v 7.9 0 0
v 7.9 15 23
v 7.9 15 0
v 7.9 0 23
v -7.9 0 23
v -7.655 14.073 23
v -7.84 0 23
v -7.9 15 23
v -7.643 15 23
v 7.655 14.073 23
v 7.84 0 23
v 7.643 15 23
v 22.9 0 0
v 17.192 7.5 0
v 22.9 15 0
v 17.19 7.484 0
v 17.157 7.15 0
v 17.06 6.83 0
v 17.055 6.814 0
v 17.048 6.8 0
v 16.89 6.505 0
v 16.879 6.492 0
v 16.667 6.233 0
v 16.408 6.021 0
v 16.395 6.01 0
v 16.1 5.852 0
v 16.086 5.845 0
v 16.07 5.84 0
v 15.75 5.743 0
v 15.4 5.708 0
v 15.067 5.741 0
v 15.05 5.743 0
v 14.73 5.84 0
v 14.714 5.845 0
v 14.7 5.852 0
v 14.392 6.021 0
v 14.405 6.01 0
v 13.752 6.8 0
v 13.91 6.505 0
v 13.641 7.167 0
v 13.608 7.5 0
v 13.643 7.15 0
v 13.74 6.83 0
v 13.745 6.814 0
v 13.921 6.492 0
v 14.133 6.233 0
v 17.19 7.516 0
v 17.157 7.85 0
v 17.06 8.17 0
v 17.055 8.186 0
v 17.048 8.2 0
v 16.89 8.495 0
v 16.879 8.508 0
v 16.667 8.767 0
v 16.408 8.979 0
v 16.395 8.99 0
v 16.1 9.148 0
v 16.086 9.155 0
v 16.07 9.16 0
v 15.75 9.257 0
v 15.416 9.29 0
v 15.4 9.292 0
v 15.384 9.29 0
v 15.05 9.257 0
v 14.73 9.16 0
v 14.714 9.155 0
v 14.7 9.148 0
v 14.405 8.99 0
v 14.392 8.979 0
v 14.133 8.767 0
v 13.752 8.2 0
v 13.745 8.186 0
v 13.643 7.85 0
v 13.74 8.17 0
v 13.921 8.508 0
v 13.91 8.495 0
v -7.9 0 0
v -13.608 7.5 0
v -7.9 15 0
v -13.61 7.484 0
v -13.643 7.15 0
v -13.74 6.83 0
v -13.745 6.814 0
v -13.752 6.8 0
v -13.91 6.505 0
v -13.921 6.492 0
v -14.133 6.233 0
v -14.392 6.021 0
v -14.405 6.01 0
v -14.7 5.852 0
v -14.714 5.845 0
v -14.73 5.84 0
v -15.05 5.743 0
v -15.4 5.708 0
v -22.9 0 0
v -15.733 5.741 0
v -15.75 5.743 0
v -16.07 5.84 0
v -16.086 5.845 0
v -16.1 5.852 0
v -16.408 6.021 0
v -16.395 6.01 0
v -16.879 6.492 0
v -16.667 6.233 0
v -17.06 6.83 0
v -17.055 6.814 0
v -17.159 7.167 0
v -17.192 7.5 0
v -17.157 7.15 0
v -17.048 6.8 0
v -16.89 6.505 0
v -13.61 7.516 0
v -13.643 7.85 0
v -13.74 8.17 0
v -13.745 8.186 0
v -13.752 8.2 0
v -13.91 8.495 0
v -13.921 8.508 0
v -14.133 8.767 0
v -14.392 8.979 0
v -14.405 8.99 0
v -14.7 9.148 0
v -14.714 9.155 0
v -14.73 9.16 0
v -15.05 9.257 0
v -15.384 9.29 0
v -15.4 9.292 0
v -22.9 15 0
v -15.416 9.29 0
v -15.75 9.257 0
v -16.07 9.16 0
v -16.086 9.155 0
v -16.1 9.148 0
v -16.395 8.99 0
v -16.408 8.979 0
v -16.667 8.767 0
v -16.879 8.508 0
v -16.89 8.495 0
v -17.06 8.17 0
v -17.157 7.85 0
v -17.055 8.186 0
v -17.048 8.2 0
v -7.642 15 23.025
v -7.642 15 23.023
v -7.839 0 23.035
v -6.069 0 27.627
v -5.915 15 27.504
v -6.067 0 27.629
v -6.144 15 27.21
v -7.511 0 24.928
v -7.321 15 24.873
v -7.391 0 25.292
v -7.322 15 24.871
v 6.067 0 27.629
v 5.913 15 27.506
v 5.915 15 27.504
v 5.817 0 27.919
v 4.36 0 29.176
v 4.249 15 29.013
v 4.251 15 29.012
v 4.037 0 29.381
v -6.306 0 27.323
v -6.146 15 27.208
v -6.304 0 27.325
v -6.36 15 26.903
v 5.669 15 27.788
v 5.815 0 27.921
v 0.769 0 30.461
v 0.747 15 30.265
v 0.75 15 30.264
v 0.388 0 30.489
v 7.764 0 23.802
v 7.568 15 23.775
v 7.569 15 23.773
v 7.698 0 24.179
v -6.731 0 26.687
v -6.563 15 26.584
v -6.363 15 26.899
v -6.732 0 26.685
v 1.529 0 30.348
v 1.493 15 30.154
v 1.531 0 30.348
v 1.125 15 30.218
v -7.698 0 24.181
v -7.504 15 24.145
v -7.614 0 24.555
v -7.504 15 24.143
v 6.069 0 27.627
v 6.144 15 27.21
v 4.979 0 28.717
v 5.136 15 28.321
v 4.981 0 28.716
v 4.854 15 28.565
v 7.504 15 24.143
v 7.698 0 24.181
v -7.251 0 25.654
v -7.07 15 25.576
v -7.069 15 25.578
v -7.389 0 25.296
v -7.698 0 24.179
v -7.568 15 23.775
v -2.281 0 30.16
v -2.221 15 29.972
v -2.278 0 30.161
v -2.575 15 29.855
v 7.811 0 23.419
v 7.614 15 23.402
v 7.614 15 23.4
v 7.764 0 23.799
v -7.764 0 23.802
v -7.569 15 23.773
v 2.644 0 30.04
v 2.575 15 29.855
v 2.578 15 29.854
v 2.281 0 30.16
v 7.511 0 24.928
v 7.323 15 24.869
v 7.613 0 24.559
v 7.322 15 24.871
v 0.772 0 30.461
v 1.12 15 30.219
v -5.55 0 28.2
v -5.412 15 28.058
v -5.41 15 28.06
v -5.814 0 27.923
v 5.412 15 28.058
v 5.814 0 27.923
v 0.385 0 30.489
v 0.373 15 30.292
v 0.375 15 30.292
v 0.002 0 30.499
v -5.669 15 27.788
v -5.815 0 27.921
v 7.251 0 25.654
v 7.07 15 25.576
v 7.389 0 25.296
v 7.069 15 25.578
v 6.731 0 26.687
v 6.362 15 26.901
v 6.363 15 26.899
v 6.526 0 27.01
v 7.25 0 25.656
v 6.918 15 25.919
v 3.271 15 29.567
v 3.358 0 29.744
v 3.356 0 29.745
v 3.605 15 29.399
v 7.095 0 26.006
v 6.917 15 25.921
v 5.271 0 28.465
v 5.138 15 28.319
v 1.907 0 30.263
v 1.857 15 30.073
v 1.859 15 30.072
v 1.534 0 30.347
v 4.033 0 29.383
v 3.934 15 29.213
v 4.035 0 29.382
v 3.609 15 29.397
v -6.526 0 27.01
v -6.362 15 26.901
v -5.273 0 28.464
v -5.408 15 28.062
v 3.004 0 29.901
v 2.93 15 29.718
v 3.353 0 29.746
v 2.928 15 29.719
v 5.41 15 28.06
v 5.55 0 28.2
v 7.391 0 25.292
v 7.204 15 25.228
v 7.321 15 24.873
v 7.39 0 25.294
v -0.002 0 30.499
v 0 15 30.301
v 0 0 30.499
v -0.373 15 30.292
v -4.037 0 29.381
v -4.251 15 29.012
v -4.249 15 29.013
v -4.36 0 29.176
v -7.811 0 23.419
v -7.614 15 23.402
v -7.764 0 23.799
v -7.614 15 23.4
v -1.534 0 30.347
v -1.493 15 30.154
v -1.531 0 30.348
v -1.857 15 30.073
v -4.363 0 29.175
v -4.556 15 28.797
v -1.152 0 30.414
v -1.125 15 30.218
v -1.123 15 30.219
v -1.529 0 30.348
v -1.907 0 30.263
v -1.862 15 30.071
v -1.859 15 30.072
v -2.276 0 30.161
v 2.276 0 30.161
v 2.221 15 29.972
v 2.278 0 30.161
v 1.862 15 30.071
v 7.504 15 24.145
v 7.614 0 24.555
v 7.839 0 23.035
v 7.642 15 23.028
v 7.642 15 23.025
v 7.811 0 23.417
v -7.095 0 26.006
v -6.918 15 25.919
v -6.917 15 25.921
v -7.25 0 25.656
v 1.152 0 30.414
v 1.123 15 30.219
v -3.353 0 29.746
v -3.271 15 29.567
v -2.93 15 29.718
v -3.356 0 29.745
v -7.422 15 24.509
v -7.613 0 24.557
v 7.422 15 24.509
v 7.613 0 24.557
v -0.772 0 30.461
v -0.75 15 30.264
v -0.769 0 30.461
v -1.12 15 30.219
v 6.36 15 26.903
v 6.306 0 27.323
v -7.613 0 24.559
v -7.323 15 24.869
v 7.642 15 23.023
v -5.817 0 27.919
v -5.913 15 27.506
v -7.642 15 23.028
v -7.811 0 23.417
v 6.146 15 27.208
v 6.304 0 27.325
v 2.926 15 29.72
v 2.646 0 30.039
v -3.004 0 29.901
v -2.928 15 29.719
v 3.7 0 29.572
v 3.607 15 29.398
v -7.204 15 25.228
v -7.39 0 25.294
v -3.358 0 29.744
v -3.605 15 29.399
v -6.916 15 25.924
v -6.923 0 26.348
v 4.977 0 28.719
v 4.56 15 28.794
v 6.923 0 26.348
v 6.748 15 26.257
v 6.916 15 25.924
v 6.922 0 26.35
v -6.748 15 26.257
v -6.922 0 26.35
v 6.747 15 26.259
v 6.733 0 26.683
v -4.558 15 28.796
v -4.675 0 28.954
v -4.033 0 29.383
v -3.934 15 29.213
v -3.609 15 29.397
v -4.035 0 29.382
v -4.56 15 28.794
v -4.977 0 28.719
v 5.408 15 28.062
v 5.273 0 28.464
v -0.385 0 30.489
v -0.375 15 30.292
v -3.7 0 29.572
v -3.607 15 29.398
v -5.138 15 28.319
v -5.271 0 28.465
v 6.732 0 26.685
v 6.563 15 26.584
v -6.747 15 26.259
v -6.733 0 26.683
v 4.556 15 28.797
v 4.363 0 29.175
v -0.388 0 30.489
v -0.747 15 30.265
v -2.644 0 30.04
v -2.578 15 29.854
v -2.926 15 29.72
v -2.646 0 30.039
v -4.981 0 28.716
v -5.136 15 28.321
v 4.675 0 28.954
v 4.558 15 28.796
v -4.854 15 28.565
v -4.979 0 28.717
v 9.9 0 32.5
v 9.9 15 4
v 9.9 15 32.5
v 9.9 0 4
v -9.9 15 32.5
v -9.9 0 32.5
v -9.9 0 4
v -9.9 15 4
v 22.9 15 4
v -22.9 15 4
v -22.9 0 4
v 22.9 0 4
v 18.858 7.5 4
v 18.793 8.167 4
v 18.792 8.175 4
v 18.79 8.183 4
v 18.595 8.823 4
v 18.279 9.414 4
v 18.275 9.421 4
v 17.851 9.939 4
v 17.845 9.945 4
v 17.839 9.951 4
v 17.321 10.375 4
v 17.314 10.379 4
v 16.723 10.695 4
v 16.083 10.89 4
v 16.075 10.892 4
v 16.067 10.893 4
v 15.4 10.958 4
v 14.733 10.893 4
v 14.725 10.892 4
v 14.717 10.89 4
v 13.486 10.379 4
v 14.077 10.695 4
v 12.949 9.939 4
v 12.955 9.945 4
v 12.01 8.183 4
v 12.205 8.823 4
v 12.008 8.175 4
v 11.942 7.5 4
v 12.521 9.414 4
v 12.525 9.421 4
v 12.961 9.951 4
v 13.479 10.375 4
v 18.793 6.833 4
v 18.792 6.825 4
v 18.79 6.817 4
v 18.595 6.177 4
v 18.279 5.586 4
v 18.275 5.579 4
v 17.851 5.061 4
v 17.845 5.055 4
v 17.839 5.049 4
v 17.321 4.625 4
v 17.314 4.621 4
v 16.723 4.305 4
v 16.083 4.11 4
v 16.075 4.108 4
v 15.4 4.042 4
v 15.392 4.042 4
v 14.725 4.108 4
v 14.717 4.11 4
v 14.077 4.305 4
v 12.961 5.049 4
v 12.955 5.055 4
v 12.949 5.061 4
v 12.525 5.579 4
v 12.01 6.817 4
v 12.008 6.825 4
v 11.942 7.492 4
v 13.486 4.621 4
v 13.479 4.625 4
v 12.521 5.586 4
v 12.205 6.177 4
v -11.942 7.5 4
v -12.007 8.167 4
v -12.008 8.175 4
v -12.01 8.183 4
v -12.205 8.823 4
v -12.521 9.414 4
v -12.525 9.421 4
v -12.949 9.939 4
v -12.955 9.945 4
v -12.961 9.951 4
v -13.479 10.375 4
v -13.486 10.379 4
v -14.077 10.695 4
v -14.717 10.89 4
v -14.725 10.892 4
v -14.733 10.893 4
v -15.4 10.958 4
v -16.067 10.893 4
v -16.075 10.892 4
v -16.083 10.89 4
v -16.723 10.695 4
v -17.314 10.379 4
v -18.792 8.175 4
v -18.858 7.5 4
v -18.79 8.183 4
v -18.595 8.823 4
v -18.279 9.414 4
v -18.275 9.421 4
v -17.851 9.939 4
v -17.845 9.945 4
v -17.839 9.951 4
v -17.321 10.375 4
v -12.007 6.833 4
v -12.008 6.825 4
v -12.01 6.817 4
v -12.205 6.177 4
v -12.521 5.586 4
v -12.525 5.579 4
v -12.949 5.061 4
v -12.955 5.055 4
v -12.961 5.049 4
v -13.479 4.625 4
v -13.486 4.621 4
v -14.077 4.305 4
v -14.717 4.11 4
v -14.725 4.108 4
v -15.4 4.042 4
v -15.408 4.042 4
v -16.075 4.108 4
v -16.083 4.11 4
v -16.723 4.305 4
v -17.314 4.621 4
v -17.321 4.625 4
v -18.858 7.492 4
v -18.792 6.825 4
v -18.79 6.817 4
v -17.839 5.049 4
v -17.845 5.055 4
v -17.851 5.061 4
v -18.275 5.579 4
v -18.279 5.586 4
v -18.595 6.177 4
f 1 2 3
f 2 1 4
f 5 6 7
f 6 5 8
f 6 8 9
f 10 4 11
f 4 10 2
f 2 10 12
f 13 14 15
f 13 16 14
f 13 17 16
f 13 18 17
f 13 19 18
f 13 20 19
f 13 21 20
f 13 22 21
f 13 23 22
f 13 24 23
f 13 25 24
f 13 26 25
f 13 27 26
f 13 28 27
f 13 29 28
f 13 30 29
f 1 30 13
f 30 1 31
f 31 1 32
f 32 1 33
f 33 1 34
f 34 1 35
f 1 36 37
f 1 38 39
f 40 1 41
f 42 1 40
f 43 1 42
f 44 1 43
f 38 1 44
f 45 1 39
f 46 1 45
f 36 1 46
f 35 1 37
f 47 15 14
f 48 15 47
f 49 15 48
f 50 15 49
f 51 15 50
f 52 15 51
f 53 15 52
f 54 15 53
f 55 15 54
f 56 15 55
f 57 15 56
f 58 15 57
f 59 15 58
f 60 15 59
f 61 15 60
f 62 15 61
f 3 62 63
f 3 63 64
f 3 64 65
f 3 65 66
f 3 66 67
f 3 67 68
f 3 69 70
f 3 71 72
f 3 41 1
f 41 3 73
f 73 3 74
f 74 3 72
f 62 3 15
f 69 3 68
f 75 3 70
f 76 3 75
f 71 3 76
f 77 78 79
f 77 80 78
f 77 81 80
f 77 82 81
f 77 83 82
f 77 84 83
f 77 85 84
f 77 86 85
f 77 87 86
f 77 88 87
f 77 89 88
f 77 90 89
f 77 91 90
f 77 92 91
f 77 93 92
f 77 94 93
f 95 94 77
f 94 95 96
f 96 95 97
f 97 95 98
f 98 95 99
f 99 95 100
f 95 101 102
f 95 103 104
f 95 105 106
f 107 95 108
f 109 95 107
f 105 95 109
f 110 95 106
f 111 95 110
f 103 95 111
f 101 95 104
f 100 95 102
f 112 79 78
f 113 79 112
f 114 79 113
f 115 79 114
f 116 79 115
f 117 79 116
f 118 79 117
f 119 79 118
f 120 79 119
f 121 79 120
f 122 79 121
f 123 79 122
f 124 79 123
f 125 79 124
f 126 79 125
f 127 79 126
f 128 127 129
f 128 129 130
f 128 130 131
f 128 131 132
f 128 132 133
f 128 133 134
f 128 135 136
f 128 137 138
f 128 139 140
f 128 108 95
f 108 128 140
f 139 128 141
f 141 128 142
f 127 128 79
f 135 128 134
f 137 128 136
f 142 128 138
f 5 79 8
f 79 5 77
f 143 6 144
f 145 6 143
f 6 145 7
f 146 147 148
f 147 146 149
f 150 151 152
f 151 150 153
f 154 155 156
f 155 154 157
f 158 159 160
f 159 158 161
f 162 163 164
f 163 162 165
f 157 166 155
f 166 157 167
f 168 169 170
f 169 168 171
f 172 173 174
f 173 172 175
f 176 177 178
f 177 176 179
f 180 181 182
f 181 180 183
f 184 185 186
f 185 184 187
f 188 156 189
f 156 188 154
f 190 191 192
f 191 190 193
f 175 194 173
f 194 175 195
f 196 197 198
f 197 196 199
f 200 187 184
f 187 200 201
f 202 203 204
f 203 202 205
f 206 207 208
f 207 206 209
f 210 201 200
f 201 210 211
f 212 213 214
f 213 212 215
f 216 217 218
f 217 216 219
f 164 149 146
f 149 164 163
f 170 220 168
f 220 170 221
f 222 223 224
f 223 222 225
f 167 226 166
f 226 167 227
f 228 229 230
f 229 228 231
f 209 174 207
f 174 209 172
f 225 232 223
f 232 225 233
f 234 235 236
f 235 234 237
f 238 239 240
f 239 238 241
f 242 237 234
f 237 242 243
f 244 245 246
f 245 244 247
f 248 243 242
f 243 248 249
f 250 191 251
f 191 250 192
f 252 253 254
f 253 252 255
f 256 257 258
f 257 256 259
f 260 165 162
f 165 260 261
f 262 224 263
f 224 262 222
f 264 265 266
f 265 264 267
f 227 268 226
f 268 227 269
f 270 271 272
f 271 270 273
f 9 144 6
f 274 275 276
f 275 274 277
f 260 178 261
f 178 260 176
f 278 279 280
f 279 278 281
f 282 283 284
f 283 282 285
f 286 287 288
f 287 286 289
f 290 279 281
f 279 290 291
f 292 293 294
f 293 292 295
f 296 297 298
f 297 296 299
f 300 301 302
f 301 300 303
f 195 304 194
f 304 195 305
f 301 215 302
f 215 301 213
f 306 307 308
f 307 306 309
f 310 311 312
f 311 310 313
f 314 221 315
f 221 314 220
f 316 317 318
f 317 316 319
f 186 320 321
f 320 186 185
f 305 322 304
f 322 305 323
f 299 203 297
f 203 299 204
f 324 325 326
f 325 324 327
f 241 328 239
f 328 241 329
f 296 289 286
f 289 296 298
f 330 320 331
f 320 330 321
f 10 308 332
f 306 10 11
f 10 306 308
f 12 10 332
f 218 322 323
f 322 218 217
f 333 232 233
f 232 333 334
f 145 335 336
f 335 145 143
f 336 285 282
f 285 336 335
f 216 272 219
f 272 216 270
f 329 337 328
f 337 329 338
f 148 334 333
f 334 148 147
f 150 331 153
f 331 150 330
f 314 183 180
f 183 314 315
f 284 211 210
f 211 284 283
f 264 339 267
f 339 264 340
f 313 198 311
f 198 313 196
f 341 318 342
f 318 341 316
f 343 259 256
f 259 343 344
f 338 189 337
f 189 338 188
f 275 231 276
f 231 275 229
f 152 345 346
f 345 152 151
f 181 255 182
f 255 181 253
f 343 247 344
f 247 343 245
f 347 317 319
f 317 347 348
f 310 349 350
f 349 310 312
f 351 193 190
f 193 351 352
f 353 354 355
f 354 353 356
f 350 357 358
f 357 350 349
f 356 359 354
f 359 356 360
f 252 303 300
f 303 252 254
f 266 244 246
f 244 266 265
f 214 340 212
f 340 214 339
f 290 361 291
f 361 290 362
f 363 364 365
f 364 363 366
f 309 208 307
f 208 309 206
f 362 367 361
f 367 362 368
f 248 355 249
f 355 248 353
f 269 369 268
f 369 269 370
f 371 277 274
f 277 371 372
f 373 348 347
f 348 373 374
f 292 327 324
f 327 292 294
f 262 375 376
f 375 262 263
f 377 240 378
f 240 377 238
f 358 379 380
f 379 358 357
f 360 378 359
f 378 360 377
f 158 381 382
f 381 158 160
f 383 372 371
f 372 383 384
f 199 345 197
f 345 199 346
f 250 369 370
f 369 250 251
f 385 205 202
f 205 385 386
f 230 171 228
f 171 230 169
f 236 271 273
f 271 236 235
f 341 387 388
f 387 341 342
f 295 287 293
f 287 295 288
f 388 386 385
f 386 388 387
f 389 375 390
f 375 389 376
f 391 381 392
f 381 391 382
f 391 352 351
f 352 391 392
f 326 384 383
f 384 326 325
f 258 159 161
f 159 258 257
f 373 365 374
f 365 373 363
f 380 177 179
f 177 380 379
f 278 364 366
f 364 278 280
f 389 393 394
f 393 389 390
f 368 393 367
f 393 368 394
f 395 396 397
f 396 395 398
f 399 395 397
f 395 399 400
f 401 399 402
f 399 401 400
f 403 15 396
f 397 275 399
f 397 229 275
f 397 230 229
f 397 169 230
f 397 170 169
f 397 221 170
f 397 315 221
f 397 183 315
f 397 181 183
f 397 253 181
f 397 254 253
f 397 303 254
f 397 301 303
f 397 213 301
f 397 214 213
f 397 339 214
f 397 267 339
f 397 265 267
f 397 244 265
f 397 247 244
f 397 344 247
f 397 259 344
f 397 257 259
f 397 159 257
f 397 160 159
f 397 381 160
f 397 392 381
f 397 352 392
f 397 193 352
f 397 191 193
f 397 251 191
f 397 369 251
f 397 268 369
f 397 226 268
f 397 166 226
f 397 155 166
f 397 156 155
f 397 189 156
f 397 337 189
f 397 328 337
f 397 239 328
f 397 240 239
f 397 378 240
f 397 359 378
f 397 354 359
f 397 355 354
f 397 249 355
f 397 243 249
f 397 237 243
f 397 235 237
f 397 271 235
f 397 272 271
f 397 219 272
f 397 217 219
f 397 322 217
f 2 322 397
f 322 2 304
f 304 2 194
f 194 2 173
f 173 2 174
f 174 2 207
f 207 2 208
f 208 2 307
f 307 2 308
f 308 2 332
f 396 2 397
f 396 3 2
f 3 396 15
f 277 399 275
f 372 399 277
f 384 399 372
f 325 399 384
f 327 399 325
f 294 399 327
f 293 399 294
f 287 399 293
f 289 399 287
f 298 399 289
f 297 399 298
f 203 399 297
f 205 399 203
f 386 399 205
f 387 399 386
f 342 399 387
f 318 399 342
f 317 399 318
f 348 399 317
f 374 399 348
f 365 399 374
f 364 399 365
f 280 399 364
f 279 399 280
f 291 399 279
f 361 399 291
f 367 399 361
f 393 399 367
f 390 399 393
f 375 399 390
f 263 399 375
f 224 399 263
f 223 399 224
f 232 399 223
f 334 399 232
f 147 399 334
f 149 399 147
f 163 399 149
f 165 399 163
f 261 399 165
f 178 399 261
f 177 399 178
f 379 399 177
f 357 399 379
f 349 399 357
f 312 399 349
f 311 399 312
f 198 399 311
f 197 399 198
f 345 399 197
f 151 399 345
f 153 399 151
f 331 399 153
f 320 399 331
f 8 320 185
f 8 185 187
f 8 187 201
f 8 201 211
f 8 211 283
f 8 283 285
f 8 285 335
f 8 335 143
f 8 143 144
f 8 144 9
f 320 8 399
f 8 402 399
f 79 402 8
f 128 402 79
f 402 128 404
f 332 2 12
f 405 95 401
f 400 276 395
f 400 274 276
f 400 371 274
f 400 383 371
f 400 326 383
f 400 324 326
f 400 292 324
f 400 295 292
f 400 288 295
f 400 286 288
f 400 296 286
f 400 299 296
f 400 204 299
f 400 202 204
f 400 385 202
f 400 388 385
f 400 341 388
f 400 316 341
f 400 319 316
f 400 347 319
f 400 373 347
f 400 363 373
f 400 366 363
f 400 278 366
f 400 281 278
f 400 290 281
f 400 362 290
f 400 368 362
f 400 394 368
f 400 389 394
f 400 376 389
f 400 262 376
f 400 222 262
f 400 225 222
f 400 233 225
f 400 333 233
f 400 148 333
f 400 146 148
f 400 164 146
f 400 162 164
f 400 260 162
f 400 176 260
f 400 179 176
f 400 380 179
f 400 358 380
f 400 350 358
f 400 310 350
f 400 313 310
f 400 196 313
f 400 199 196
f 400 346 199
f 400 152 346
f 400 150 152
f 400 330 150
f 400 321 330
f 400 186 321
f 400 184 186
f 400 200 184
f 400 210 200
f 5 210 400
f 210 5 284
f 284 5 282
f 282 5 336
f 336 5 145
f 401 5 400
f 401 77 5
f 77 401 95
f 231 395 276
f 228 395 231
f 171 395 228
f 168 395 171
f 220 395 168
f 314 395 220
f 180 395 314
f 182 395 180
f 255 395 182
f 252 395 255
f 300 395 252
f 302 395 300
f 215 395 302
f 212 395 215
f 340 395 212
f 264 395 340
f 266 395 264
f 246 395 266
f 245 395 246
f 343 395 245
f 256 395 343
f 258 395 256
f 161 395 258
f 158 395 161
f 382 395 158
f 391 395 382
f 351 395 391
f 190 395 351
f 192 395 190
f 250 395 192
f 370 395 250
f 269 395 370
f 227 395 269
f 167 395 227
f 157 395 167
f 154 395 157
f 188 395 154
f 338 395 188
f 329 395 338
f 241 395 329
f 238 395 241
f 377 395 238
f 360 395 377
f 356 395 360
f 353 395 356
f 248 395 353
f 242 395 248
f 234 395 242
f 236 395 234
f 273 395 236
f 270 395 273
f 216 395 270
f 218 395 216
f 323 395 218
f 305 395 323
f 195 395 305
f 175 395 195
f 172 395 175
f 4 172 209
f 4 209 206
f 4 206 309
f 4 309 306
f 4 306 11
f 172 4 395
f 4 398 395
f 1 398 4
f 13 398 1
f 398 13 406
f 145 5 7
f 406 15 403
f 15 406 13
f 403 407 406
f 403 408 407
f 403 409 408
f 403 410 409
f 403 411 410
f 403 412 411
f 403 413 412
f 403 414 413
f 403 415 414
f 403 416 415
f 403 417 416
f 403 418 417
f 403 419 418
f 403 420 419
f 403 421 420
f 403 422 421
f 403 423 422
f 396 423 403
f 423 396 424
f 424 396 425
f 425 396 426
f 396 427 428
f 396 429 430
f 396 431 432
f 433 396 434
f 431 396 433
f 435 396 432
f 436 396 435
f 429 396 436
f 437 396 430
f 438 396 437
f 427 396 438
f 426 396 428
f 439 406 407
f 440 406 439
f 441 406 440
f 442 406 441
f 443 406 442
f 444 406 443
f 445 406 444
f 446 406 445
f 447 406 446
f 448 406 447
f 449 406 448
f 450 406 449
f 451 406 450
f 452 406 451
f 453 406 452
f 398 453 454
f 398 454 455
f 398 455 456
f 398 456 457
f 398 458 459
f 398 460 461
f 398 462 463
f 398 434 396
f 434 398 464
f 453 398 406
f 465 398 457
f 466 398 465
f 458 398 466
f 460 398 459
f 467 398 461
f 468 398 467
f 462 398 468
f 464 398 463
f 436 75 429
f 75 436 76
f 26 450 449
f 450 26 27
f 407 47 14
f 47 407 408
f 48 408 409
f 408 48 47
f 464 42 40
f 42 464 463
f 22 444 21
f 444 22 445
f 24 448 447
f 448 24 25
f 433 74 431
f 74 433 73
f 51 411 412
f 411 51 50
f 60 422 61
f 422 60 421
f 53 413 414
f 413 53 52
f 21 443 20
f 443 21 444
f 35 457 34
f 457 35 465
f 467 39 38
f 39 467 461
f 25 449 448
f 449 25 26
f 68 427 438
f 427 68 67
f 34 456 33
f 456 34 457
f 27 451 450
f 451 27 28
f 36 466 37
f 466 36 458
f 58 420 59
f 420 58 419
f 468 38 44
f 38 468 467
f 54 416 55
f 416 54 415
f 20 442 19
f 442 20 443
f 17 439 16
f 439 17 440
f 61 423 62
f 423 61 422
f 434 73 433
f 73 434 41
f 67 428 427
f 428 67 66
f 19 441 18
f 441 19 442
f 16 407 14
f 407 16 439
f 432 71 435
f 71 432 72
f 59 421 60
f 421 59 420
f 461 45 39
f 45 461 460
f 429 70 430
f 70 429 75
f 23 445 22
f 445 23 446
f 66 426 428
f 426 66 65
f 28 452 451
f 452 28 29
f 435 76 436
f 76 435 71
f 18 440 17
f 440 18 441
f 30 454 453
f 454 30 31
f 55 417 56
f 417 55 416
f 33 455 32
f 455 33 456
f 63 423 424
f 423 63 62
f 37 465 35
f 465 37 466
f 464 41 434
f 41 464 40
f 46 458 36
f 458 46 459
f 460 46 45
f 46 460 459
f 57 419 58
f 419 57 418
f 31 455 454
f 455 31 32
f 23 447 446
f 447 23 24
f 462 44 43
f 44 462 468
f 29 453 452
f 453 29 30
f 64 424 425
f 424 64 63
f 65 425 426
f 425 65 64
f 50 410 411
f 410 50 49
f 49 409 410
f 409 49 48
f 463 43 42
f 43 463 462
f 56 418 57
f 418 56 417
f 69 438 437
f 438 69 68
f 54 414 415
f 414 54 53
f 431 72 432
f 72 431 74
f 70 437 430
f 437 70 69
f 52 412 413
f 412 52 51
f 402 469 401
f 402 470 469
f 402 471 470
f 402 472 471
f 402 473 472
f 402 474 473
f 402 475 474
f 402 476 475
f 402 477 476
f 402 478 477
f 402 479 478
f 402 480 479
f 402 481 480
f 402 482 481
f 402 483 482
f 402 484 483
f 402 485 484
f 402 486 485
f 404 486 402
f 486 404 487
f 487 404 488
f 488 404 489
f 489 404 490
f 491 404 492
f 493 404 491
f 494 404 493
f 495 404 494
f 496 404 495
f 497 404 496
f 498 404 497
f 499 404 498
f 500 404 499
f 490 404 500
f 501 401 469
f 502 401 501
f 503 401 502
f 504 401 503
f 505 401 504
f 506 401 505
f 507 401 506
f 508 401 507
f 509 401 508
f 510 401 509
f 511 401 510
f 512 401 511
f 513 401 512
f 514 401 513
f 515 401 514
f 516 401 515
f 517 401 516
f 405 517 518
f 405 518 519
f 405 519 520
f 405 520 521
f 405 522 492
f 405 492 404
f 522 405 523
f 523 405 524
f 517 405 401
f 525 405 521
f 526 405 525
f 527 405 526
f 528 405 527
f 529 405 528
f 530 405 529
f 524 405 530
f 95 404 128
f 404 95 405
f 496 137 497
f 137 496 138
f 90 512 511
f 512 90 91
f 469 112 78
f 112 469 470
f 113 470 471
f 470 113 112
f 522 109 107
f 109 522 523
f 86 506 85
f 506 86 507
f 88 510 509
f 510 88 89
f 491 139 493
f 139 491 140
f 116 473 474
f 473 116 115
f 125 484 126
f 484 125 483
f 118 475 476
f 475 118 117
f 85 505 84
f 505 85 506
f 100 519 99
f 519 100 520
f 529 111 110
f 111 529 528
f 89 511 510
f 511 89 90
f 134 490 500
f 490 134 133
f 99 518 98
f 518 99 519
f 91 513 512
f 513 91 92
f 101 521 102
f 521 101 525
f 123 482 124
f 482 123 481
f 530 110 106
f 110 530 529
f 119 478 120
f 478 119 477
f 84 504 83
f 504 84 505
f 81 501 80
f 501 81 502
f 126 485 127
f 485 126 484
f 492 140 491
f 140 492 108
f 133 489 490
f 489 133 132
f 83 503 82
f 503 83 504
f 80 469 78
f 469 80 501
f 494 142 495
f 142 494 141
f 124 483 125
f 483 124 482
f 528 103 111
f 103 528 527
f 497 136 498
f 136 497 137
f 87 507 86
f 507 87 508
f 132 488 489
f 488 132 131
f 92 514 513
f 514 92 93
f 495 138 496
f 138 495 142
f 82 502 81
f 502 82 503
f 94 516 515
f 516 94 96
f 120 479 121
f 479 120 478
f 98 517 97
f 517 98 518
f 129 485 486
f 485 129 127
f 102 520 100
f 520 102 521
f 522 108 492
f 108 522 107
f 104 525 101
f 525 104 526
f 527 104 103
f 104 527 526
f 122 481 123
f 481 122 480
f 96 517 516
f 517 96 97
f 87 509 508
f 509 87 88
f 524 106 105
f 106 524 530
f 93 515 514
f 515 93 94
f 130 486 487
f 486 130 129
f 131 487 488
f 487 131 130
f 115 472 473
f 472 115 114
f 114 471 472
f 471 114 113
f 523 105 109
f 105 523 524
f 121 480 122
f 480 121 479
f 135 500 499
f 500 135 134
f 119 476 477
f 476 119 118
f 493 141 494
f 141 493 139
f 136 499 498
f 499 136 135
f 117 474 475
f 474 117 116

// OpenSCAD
org_mot_od=35;
mot_od=org_mot_od+0.7;

org_dyn_od=33.6;
dyn_od=org_dyn_od+0.7;


dyn_od1_sm=15+0.7;
dyn_od2_sm=14.6+0.7;


comp_h=(mot_od-dyn_od)/2;//ausgleich um auf die gleiche höhe wie motor zu kommen
echo (comp_h);

part=0.7;
br_wd=15;
br_th=5;
br_h=dyn_od*part+br_th;
br_of=dyn_od/2+br_th+comp_h;
br_sp=dyn_od+br_th;//span of bracket
br_lth=4;
cl_h=dyn_od+br_th;
$fn=128;


//clamp_and_flap();
 //bracket_and_flap();
//bracket_sm();
clamp_sm_and_flap();

module clamp_and_flap(){
    clamp();
    translate([br_sp/2,-br_wd/2,0]) flapr();
    translate([-br_sp/2,-br_wd/2,0]) flapl();
}


module clamp(){    
    cl_xtra=4;
    translate([0,0,dyn_od/2]){
        difference(){
            translate([0,0,br_th/2+cl_xtra/2]) 
                cube([br_sp,br_wd,cl_h+cl_xtra],center=true);
            union(){
                translate([0,-br_wd/2-0.5,+cl_xtra]) rotate([-90,0,0]) cylinder(d=dyn_od,h=br_wd+1);
                translate([0,-0.1,-dyn_od/4+cl_xtra/2]) cube([dyn_od,br_wd+1,dyn_od/2+cl_xtra],center=true);
            }
        }
        //spoint([0,-br_wd/2-0.5,+cl_xtra]);
    }
  
}


module bracket_and_flap(){
    bracket();
    translate([br_sp/2,0,0]) flapr();
    translate([-br_sp/2,0,0]) flapl();

};

module flapr(){
     flscrd=3.5;
    difference(){
        cube([15,br_wd,br_lth]);
        translate([15/2,br_wd/2,-0.1]) cylinder(r1=flscrd/2,r2=flscrd/2*2,h=br_lth+0.2,$fn=32);
    }
}
module flapl(){
    flscrd=3.5;
    translate([-15,0,0]){
        
        difference(){
            cube([15,br_wd,br_lth]);
            translate([15/2,br_wd/2,-0.1]) cylinder(r1=flscrd/2,r2=flscrd/2*2,h=br_lth+0.2,$fn=32);
        }
    }
}

module bracket(){
    difference(){
        translate([-br_sp/2,0,0]) cube([br_sp,br_wd,br_h]);
        translate([0,-0.5,br_of]) rotate([-90,0,0]) cylinder(d=dyn_od,h=br_wd+1);
        echo(br_of);
    };
    //spoint([0,-0.5,br_of]);
}

module bracket_sm(){    
    comp_h=(mot_od-dyn_od1_sm)/2;
    sbr_sp=dyn_od1_sm;
    spart=1;
    sbr_h=dyn_od1_sm*spart+br_th;
    sbr_of=dyn_od1_sm/2+br_th+comp_h;
   
    
    difference(){
        translate([-sbr_sp/2,0,0]) cube([sbr_sp,br_wd,sbr_h]);
        
        translate([0,-0.1,sbr_of]) 
            rotate([-90,0,0]) 
                cylinder(d1=dyn_od1_sm,d2=dyn_od2_sm,h=br_wd+0.2);
    };

}

module clamp_sm_and_flap(){
    sbr_sp=dyn_od1_sm+0.1;
    clamp_sm(sbr_sp);
    translate([sbr_sp/2,0,0]) flapr();
    translate([-sbr_sp/2,0,0]) flapl();
}


module clamp_sm(sbr_sp){    
    zsri=0.2; //shrink z so clamp is tight
    comp_h=(mot_od-dyn_od1_sm)/2;
    
    spart=1;
    sbr_h=dyn_od1_sm*spart+br_th;
    sbr_of=dyn_od1_sm/2+br_th+comp_h;
    outer_sbr_sp=sbr_sp+br_lth;
    difference(){        
        translate([-outer_sbr_sp/2,0,0]) 
            cube([outer_sbr_sp,br_wd,sbr_of+dyn_od1_sm/2+2-zsri]);
        union(){
            translate([-sbr_sp/2,-0.1,0]) cube([sbr_sp,br_wd+0.2,sbr_h+2.5-zsri]);            
            translate([0,-0.1,sbr_of-zsri]) 
                rotate([-90,0,0]) 
                    cylinder(d1=dyn_od1_sm,d2=dyn_od2_sm,h=br_wd+0.2);
        };
    }

}








module spoint(coord){
    cus=0.5;
     translate(coord) color("red") cube([cus,cus,cus],center=true);
}
